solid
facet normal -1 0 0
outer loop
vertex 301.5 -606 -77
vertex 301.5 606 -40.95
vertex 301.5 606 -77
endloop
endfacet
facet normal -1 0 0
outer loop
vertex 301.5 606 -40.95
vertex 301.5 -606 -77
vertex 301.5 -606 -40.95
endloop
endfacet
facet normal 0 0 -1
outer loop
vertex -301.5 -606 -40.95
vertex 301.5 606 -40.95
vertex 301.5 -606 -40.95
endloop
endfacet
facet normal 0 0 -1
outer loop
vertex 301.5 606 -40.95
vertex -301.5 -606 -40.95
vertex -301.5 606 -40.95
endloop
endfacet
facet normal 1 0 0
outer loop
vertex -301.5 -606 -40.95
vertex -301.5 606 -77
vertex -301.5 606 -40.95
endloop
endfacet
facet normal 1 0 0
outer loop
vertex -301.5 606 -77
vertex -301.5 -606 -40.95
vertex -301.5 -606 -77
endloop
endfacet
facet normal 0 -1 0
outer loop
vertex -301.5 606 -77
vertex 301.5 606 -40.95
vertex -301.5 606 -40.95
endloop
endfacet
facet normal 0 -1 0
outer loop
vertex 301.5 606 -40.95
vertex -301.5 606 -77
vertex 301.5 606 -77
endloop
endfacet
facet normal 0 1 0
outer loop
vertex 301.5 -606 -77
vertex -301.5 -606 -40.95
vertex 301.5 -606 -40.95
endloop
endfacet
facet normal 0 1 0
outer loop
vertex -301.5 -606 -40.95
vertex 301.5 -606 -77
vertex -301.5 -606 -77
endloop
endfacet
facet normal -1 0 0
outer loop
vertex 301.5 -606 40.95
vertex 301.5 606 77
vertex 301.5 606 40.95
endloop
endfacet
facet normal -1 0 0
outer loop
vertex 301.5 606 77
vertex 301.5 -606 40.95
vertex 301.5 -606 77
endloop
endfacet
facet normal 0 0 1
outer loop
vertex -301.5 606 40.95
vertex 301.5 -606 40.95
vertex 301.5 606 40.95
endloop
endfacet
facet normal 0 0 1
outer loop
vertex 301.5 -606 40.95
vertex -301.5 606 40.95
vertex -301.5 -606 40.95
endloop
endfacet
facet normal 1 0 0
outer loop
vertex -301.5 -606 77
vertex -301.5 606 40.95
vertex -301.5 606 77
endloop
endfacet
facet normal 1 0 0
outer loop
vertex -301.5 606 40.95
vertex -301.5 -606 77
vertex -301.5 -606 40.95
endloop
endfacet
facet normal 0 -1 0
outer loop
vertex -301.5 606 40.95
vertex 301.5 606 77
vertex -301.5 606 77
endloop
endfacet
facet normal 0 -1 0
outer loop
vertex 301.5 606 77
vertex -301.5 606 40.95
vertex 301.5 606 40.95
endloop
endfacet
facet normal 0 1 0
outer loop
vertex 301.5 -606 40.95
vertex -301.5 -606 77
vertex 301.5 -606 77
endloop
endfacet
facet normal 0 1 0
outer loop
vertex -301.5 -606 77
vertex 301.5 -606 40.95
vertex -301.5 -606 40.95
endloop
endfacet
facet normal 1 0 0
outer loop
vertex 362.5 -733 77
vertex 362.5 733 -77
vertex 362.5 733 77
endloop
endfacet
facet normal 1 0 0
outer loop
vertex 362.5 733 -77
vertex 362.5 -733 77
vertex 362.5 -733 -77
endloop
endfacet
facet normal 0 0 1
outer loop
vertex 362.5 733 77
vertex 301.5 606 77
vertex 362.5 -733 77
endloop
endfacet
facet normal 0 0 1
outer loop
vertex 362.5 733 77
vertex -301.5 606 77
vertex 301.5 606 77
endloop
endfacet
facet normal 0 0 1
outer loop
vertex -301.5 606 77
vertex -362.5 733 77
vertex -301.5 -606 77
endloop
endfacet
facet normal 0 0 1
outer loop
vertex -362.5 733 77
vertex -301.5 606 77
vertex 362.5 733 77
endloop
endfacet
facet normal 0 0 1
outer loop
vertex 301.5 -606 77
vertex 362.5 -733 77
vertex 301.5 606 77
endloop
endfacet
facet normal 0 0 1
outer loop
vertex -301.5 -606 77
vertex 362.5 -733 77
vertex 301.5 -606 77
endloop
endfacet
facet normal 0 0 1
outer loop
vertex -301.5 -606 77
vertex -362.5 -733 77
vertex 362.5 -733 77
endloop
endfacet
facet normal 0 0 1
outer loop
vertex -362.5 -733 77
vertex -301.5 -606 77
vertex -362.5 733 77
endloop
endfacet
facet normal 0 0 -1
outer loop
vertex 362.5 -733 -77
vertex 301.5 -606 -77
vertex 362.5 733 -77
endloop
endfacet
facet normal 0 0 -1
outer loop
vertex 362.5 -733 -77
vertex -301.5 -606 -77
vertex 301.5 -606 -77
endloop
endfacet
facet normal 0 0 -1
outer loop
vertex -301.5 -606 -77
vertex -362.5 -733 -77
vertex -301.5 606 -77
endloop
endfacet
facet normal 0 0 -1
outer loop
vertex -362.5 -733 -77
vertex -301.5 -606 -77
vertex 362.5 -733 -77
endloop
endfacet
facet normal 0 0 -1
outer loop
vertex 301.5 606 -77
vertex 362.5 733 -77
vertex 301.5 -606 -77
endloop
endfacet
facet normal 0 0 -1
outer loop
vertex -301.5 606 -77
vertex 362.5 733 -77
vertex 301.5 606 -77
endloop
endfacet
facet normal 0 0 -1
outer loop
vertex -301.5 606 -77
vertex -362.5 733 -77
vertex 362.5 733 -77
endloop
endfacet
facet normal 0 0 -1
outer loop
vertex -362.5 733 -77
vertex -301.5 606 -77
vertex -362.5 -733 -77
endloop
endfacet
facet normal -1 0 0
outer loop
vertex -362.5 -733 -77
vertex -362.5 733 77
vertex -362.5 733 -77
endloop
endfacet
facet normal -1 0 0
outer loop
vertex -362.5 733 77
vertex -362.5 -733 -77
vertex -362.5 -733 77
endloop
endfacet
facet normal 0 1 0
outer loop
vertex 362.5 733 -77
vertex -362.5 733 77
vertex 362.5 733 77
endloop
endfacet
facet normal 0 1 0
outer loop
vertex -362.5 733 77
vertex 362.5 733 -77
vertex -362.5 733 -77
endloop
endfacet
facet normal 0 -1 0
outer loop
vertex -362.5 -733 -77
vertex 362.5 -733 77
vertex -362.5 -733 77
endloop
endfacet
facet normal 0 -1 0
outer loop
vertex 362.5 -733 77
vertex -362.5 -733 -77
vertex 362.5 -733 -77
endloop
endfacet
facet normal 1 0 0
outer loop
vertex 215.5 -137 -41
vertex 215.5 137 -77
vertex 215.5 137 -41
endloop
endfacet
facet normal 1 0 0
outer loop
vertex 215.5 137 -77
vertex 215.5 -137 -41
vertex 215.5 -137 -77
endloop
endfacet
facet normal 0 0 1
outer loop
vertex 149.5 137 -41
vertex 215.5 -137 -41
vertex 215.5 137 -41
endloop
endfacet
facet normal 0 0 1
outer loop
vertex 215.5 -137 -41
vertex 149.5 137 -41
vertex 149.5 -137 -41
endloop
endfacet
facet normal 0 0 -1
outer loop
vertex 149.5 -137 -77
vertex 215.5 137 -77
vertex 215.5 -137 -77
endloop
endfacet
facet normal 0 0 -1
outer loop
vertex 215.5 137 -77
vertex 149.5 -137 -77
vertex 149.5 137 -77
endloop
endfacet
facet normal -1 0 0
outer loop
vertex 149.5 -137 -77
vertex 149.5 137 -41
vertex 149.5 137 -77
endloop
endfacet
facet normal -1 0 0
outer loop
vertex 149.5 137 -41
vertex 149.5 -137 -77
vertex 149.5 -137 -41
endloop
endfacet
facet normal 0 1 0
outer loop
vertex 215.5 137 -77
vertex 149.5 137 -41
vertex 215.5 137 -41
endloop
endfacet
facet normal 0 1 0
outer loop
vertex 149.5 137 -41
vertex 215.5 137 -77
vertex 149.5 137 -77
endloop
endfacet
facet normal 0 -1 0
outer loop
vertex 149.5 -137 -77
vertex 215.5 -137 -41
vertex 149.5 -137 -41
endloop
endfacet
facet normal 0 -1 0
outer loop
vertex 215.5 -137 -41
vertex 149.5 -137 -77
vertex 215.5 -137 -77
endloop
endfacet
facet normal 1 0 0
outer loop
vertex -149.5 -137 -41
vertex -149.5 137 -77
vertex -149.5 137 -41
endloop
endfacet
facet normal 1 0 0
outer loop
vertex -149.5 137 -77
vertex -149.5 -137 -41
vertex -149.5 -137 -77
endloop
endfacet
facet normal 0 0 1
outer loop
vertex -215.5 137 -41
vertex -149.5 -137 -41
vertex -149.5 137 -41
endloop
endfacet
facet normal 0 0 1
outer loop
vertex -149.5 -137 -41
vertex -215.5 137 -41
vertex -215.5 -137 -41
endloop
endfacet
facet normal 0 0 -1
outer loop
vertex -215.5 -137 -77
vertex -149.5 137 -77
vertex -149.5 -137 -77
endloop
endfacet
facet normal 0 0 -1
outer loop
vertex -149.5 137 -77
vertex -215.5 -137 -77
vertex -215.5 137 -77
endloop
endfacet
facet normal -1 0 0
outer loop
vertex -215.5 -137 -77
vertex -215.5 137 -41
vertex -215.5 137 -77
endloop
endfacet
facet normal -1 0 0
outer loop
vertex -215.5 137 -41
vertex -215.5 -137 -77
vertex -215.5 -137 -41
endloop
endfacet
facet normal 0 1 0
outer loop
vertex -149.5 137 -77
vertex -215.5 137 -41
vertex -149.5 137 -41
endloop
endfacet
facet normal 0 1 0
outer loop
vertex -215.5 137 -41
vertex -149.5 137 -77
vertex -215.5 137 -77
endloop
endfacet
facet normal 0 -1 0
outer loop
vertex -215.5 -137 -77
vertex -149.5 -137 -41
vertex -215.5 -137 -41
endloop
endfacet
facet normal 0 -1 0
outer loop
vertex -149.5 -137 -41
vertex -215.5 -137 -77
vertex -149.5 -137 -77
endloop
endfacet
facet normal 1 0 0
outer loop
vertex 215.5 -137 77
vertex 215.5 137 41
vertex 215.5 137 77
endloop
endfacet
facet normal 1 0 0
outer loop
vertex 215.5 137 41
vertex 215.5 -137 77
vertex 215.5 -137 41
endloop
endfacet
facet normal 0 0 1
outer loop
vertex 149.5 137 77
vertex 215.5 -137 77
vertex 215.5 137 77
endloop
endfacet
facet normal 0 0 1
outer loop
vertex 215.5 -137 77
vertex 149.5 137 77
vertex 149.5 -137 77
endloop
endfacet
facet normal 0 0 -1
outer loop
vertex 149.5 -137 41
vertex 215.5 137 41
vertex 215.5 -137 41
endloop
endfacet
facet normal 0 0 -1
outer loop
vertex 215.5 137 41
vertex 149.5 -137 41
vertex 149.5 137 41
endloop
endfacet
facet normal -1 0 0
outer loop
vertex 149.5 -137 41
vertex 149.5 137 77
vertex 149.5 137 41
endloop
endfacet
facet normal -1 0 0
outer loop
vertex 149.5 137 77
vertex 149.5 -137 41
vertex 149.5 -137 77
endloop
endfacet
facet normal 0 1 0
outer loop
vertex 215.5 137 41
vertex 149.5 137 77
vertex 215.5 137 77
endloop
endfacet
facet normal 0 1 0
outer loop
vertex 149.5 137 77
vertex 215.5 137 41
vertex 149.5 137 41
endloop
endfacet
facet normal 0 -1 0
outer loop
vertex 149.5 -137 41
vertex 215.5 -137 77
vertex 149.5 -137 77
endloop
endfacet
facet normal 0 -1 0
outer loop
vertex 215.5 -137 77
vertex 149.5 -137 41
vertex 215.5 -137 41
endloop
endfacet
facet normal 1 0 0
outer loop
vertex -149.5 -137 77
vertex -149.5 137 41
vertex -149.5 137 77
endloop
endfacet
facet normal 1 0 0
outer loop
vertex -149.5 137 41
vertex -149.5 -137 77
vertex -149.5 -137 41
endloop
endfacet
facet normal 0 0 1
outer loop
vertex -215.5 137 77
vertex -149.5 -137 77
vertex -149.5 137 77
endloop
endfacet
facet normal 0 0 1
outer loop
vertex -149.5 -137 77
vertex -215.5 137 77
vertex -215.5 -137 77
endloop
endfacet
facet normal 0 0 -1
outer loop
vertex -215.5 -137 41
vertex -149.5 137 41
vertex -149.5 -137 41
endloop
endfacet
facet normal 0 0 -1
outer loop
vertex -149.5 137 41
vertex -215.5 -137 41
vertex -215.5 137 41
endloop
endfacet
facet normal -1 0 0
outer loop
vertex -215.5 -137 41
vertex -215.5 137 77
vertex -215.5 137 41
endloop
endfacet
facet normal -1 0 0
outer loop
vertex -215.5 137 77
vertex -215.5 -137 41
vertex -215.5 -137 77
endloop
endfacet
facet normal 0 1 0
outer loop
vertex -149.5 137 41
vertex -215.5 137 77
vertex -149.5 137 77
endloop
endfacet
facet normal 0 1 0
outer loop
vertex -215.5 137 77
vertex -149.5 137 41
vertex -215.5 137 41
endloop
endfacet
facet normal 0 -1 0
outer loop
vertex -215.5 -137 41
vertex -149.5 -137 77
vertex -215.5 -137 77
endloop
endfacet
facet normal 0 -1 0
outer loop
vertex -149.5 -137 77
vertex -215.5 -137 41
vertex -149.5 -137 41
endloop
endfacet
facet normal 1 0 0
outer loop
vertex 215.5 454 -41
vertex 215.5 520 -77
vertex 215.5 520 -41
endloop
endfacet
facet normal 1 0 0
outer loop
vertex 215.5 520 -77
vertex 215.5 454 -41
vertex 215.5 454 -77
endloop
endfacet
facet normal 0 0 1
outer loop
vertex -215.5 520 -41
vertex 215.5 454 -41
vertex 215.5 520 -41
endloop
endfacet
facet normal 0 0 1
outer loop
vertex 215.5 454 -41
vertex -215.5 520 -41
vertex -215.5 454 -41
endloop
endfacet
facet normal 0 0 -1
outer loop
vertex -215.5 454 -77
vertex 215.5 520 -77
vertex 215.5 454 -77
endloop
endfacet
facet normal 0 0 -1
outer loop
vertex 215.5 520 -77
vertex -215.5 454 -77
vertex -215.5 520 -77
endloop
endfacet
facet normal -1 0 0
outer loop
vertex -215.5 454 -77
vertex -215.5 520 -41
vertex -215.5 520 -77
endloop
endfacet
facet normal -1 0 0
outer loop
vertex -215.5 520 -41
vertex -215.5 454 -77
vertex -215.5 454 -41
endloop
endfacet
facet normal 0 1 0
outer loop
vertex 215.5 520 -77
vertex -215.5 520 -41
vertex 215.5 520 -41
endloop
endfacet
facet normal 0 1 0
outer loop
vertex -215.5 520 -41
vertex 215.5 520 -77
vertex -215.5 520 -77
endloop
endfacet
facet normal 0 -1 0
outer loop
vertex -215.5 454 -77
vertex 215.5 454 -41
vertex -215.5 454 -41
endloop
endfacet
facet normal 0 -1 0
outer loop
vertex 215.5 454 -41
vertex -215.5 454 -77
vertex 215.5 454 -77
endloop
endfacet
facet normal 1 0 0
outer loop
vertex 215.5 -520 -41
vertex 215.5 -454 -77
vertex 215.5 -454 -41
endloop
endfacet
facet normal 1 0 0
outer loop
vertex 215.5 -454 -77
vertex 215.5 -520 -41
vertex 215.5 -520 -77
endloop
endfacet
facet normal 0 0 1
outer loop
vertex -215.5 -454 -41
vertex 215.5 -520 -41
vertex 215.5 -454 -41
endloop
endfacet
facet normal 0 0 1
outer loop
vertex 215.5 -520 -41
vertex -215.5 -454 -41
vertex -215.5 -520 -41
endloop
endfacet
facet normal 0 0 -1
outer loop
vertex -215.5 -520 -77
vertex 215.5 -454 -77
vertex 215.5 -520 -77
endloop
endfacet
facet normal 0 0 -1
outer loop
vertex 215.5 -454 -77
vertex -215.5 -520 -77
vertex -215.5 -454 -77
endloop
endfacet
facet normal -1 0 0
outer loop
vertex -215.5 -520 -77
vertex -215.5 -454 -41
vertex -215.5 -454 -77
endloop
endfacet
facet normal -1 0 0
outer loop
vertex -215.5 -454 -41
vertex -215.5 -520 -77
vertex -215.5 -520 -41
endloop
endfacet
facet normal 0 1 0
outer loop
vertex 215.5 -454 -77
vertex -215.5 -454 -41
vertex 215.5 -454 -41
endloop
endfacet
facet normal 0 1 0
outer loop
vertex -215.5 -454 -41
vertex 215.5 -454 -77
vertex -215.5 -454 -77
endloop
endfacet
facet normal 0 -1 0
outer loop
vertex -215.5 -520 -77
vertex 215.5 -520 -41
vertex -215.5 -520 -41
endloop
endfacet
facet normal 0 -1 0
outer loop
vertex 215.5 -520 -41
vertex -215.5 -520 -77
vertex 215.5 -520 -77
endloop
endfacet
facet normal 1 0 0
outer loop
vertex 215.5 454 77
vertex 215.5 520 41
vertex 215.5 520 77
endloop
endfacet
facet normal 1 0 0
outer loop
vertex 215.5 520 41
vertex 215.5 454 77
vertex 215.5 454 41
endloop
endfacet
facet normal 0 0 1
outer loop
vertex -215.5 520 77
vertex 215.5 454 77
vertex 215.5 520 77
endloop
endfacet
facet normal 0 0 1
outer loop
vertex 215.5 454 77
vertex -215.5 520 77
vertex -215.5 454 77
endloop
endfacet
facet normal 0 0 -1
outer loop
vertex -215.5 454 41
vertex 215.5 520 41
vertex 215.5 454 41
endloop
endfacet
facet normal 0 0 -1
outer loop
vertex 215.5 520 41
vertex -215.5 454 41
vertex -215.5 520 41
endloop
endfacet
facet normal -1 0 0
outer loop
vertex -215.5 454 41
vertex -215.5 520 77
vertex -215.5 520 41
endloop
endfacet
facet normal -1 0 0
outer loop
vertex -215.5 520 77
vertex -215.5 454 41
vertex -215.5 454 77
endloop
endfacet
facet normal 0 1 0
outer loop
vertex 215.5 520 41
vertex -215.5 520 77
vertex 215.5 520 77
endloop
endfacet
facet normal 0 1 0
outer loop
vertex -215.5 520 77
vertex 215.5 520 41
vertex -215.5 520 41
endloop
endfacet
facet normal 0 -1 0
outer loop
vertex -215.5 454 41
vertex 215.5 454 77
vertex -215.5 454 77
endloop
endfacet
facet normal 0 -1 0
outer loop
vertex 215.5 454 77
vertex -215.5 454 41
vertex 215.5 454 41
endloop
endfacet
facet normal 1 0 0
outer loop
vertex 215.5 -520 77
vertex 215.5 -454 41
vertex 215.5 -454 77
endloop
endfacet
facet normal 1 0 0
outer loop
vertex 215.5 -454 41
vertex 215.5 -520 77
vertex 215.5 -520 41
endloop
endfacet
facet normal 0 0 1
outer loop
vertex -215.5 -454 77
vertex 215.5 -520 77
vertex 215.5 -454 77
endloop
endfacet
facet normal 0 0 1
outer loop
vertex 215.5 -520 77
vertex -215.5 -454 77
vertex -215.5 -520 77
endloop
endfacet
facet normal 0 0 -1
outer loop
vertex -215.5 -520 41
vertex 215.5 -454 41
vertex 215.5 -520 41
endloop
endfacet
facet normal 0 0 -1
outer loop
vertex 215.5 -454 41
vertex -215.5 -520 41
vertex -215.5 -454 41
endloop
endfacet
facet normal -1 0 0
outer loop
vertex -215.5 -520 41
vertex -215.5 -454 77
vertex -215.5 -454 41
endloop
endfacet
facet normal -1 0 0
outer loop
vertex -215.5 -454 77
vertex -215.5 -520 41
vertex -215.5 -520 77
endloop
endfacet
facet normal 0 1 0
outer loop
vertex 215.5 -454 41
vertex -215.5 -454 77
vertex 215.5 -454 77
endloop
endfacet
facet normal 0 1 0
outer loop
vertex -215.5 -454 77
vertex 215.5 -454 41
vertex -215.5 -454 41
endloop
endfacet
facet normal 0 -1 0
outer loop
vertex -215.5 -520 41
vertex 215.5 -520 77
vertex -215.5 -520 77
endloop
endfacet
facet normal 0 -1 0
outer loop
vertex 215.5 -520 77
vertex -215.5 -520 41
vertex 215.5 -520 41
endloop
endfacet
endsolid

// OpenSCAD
// Box dimensions
box_width = 725;
box_depth = 1466;
box_height = 154;

// Recess parameters
recess_depth = 36;
bezel_width_x = 61;
bezel_width_y = 127;

// Calculated recess dimensions
recess_width = box_width - (2 * bezel_width_x);
recess_depth_y = box_depth - (2 * bezel_width_y);

// Protruding box parameters
protrude_width = 66;
protrude_depth = 274;
protrude_height = 36;
protrude_x_offset = (recess_width/2) - 86 - (protrude_width/2); // 86 units from end of recess

// Second protruding box parameters (maximum width with 86 clearance)
protrude2_width = recess_width - (2 * 86); // Maximum width leaving 86 on each side
protrude2_depth = 66;
protrude2_height = 36;
protrude2_y_offset = (recess_depth_y/2) - 86 - (protrude2_depth/2); // 86 units from end of recess

union() {
    difference() {
        // Main box
        cube([box_width, box_depth, box_height], center=true);
        
        // Recess cutouts on top and bottom using a loop
        for (z_pos = [-(box_height - recess_depth) / 2, (box_height - recess_depth) / 2]) {
            translate([0, 0, z_pos]) {
                cube([recess_width, recess_depth_y, recess_depth + 0.1], center=true);
            }
        }
    }
    
    // Protruding boxes on both sides of top and bottom recess areas
    for (z_pos = [-(box_height - recess_depth) / 2, (box_height - recess_depth) / 2]) {
        for (x_pos = [protrude_x_offset, -protrude_x_offset]) {
            translate([x_pos, 0, z_pos]) {
                cube([protrude_width, protrude_depth, protrude_height], center=true);
            }
        }
    }
    
    // Second protruding box on both sides of top and bottom recess areas
    for (z_pos = [-(box_height - recess_depth) / 2, (box_height - recess_depth) / 2]) {
        for (y_pos = [protrude2_y_offset, -protrude2_y_offset]) {
            translate([0, y_pos, z_pos]) {
                cube([protrude2_width, protrude2_depth, protrude2_height], center=true);
            }
        }
    }
}
